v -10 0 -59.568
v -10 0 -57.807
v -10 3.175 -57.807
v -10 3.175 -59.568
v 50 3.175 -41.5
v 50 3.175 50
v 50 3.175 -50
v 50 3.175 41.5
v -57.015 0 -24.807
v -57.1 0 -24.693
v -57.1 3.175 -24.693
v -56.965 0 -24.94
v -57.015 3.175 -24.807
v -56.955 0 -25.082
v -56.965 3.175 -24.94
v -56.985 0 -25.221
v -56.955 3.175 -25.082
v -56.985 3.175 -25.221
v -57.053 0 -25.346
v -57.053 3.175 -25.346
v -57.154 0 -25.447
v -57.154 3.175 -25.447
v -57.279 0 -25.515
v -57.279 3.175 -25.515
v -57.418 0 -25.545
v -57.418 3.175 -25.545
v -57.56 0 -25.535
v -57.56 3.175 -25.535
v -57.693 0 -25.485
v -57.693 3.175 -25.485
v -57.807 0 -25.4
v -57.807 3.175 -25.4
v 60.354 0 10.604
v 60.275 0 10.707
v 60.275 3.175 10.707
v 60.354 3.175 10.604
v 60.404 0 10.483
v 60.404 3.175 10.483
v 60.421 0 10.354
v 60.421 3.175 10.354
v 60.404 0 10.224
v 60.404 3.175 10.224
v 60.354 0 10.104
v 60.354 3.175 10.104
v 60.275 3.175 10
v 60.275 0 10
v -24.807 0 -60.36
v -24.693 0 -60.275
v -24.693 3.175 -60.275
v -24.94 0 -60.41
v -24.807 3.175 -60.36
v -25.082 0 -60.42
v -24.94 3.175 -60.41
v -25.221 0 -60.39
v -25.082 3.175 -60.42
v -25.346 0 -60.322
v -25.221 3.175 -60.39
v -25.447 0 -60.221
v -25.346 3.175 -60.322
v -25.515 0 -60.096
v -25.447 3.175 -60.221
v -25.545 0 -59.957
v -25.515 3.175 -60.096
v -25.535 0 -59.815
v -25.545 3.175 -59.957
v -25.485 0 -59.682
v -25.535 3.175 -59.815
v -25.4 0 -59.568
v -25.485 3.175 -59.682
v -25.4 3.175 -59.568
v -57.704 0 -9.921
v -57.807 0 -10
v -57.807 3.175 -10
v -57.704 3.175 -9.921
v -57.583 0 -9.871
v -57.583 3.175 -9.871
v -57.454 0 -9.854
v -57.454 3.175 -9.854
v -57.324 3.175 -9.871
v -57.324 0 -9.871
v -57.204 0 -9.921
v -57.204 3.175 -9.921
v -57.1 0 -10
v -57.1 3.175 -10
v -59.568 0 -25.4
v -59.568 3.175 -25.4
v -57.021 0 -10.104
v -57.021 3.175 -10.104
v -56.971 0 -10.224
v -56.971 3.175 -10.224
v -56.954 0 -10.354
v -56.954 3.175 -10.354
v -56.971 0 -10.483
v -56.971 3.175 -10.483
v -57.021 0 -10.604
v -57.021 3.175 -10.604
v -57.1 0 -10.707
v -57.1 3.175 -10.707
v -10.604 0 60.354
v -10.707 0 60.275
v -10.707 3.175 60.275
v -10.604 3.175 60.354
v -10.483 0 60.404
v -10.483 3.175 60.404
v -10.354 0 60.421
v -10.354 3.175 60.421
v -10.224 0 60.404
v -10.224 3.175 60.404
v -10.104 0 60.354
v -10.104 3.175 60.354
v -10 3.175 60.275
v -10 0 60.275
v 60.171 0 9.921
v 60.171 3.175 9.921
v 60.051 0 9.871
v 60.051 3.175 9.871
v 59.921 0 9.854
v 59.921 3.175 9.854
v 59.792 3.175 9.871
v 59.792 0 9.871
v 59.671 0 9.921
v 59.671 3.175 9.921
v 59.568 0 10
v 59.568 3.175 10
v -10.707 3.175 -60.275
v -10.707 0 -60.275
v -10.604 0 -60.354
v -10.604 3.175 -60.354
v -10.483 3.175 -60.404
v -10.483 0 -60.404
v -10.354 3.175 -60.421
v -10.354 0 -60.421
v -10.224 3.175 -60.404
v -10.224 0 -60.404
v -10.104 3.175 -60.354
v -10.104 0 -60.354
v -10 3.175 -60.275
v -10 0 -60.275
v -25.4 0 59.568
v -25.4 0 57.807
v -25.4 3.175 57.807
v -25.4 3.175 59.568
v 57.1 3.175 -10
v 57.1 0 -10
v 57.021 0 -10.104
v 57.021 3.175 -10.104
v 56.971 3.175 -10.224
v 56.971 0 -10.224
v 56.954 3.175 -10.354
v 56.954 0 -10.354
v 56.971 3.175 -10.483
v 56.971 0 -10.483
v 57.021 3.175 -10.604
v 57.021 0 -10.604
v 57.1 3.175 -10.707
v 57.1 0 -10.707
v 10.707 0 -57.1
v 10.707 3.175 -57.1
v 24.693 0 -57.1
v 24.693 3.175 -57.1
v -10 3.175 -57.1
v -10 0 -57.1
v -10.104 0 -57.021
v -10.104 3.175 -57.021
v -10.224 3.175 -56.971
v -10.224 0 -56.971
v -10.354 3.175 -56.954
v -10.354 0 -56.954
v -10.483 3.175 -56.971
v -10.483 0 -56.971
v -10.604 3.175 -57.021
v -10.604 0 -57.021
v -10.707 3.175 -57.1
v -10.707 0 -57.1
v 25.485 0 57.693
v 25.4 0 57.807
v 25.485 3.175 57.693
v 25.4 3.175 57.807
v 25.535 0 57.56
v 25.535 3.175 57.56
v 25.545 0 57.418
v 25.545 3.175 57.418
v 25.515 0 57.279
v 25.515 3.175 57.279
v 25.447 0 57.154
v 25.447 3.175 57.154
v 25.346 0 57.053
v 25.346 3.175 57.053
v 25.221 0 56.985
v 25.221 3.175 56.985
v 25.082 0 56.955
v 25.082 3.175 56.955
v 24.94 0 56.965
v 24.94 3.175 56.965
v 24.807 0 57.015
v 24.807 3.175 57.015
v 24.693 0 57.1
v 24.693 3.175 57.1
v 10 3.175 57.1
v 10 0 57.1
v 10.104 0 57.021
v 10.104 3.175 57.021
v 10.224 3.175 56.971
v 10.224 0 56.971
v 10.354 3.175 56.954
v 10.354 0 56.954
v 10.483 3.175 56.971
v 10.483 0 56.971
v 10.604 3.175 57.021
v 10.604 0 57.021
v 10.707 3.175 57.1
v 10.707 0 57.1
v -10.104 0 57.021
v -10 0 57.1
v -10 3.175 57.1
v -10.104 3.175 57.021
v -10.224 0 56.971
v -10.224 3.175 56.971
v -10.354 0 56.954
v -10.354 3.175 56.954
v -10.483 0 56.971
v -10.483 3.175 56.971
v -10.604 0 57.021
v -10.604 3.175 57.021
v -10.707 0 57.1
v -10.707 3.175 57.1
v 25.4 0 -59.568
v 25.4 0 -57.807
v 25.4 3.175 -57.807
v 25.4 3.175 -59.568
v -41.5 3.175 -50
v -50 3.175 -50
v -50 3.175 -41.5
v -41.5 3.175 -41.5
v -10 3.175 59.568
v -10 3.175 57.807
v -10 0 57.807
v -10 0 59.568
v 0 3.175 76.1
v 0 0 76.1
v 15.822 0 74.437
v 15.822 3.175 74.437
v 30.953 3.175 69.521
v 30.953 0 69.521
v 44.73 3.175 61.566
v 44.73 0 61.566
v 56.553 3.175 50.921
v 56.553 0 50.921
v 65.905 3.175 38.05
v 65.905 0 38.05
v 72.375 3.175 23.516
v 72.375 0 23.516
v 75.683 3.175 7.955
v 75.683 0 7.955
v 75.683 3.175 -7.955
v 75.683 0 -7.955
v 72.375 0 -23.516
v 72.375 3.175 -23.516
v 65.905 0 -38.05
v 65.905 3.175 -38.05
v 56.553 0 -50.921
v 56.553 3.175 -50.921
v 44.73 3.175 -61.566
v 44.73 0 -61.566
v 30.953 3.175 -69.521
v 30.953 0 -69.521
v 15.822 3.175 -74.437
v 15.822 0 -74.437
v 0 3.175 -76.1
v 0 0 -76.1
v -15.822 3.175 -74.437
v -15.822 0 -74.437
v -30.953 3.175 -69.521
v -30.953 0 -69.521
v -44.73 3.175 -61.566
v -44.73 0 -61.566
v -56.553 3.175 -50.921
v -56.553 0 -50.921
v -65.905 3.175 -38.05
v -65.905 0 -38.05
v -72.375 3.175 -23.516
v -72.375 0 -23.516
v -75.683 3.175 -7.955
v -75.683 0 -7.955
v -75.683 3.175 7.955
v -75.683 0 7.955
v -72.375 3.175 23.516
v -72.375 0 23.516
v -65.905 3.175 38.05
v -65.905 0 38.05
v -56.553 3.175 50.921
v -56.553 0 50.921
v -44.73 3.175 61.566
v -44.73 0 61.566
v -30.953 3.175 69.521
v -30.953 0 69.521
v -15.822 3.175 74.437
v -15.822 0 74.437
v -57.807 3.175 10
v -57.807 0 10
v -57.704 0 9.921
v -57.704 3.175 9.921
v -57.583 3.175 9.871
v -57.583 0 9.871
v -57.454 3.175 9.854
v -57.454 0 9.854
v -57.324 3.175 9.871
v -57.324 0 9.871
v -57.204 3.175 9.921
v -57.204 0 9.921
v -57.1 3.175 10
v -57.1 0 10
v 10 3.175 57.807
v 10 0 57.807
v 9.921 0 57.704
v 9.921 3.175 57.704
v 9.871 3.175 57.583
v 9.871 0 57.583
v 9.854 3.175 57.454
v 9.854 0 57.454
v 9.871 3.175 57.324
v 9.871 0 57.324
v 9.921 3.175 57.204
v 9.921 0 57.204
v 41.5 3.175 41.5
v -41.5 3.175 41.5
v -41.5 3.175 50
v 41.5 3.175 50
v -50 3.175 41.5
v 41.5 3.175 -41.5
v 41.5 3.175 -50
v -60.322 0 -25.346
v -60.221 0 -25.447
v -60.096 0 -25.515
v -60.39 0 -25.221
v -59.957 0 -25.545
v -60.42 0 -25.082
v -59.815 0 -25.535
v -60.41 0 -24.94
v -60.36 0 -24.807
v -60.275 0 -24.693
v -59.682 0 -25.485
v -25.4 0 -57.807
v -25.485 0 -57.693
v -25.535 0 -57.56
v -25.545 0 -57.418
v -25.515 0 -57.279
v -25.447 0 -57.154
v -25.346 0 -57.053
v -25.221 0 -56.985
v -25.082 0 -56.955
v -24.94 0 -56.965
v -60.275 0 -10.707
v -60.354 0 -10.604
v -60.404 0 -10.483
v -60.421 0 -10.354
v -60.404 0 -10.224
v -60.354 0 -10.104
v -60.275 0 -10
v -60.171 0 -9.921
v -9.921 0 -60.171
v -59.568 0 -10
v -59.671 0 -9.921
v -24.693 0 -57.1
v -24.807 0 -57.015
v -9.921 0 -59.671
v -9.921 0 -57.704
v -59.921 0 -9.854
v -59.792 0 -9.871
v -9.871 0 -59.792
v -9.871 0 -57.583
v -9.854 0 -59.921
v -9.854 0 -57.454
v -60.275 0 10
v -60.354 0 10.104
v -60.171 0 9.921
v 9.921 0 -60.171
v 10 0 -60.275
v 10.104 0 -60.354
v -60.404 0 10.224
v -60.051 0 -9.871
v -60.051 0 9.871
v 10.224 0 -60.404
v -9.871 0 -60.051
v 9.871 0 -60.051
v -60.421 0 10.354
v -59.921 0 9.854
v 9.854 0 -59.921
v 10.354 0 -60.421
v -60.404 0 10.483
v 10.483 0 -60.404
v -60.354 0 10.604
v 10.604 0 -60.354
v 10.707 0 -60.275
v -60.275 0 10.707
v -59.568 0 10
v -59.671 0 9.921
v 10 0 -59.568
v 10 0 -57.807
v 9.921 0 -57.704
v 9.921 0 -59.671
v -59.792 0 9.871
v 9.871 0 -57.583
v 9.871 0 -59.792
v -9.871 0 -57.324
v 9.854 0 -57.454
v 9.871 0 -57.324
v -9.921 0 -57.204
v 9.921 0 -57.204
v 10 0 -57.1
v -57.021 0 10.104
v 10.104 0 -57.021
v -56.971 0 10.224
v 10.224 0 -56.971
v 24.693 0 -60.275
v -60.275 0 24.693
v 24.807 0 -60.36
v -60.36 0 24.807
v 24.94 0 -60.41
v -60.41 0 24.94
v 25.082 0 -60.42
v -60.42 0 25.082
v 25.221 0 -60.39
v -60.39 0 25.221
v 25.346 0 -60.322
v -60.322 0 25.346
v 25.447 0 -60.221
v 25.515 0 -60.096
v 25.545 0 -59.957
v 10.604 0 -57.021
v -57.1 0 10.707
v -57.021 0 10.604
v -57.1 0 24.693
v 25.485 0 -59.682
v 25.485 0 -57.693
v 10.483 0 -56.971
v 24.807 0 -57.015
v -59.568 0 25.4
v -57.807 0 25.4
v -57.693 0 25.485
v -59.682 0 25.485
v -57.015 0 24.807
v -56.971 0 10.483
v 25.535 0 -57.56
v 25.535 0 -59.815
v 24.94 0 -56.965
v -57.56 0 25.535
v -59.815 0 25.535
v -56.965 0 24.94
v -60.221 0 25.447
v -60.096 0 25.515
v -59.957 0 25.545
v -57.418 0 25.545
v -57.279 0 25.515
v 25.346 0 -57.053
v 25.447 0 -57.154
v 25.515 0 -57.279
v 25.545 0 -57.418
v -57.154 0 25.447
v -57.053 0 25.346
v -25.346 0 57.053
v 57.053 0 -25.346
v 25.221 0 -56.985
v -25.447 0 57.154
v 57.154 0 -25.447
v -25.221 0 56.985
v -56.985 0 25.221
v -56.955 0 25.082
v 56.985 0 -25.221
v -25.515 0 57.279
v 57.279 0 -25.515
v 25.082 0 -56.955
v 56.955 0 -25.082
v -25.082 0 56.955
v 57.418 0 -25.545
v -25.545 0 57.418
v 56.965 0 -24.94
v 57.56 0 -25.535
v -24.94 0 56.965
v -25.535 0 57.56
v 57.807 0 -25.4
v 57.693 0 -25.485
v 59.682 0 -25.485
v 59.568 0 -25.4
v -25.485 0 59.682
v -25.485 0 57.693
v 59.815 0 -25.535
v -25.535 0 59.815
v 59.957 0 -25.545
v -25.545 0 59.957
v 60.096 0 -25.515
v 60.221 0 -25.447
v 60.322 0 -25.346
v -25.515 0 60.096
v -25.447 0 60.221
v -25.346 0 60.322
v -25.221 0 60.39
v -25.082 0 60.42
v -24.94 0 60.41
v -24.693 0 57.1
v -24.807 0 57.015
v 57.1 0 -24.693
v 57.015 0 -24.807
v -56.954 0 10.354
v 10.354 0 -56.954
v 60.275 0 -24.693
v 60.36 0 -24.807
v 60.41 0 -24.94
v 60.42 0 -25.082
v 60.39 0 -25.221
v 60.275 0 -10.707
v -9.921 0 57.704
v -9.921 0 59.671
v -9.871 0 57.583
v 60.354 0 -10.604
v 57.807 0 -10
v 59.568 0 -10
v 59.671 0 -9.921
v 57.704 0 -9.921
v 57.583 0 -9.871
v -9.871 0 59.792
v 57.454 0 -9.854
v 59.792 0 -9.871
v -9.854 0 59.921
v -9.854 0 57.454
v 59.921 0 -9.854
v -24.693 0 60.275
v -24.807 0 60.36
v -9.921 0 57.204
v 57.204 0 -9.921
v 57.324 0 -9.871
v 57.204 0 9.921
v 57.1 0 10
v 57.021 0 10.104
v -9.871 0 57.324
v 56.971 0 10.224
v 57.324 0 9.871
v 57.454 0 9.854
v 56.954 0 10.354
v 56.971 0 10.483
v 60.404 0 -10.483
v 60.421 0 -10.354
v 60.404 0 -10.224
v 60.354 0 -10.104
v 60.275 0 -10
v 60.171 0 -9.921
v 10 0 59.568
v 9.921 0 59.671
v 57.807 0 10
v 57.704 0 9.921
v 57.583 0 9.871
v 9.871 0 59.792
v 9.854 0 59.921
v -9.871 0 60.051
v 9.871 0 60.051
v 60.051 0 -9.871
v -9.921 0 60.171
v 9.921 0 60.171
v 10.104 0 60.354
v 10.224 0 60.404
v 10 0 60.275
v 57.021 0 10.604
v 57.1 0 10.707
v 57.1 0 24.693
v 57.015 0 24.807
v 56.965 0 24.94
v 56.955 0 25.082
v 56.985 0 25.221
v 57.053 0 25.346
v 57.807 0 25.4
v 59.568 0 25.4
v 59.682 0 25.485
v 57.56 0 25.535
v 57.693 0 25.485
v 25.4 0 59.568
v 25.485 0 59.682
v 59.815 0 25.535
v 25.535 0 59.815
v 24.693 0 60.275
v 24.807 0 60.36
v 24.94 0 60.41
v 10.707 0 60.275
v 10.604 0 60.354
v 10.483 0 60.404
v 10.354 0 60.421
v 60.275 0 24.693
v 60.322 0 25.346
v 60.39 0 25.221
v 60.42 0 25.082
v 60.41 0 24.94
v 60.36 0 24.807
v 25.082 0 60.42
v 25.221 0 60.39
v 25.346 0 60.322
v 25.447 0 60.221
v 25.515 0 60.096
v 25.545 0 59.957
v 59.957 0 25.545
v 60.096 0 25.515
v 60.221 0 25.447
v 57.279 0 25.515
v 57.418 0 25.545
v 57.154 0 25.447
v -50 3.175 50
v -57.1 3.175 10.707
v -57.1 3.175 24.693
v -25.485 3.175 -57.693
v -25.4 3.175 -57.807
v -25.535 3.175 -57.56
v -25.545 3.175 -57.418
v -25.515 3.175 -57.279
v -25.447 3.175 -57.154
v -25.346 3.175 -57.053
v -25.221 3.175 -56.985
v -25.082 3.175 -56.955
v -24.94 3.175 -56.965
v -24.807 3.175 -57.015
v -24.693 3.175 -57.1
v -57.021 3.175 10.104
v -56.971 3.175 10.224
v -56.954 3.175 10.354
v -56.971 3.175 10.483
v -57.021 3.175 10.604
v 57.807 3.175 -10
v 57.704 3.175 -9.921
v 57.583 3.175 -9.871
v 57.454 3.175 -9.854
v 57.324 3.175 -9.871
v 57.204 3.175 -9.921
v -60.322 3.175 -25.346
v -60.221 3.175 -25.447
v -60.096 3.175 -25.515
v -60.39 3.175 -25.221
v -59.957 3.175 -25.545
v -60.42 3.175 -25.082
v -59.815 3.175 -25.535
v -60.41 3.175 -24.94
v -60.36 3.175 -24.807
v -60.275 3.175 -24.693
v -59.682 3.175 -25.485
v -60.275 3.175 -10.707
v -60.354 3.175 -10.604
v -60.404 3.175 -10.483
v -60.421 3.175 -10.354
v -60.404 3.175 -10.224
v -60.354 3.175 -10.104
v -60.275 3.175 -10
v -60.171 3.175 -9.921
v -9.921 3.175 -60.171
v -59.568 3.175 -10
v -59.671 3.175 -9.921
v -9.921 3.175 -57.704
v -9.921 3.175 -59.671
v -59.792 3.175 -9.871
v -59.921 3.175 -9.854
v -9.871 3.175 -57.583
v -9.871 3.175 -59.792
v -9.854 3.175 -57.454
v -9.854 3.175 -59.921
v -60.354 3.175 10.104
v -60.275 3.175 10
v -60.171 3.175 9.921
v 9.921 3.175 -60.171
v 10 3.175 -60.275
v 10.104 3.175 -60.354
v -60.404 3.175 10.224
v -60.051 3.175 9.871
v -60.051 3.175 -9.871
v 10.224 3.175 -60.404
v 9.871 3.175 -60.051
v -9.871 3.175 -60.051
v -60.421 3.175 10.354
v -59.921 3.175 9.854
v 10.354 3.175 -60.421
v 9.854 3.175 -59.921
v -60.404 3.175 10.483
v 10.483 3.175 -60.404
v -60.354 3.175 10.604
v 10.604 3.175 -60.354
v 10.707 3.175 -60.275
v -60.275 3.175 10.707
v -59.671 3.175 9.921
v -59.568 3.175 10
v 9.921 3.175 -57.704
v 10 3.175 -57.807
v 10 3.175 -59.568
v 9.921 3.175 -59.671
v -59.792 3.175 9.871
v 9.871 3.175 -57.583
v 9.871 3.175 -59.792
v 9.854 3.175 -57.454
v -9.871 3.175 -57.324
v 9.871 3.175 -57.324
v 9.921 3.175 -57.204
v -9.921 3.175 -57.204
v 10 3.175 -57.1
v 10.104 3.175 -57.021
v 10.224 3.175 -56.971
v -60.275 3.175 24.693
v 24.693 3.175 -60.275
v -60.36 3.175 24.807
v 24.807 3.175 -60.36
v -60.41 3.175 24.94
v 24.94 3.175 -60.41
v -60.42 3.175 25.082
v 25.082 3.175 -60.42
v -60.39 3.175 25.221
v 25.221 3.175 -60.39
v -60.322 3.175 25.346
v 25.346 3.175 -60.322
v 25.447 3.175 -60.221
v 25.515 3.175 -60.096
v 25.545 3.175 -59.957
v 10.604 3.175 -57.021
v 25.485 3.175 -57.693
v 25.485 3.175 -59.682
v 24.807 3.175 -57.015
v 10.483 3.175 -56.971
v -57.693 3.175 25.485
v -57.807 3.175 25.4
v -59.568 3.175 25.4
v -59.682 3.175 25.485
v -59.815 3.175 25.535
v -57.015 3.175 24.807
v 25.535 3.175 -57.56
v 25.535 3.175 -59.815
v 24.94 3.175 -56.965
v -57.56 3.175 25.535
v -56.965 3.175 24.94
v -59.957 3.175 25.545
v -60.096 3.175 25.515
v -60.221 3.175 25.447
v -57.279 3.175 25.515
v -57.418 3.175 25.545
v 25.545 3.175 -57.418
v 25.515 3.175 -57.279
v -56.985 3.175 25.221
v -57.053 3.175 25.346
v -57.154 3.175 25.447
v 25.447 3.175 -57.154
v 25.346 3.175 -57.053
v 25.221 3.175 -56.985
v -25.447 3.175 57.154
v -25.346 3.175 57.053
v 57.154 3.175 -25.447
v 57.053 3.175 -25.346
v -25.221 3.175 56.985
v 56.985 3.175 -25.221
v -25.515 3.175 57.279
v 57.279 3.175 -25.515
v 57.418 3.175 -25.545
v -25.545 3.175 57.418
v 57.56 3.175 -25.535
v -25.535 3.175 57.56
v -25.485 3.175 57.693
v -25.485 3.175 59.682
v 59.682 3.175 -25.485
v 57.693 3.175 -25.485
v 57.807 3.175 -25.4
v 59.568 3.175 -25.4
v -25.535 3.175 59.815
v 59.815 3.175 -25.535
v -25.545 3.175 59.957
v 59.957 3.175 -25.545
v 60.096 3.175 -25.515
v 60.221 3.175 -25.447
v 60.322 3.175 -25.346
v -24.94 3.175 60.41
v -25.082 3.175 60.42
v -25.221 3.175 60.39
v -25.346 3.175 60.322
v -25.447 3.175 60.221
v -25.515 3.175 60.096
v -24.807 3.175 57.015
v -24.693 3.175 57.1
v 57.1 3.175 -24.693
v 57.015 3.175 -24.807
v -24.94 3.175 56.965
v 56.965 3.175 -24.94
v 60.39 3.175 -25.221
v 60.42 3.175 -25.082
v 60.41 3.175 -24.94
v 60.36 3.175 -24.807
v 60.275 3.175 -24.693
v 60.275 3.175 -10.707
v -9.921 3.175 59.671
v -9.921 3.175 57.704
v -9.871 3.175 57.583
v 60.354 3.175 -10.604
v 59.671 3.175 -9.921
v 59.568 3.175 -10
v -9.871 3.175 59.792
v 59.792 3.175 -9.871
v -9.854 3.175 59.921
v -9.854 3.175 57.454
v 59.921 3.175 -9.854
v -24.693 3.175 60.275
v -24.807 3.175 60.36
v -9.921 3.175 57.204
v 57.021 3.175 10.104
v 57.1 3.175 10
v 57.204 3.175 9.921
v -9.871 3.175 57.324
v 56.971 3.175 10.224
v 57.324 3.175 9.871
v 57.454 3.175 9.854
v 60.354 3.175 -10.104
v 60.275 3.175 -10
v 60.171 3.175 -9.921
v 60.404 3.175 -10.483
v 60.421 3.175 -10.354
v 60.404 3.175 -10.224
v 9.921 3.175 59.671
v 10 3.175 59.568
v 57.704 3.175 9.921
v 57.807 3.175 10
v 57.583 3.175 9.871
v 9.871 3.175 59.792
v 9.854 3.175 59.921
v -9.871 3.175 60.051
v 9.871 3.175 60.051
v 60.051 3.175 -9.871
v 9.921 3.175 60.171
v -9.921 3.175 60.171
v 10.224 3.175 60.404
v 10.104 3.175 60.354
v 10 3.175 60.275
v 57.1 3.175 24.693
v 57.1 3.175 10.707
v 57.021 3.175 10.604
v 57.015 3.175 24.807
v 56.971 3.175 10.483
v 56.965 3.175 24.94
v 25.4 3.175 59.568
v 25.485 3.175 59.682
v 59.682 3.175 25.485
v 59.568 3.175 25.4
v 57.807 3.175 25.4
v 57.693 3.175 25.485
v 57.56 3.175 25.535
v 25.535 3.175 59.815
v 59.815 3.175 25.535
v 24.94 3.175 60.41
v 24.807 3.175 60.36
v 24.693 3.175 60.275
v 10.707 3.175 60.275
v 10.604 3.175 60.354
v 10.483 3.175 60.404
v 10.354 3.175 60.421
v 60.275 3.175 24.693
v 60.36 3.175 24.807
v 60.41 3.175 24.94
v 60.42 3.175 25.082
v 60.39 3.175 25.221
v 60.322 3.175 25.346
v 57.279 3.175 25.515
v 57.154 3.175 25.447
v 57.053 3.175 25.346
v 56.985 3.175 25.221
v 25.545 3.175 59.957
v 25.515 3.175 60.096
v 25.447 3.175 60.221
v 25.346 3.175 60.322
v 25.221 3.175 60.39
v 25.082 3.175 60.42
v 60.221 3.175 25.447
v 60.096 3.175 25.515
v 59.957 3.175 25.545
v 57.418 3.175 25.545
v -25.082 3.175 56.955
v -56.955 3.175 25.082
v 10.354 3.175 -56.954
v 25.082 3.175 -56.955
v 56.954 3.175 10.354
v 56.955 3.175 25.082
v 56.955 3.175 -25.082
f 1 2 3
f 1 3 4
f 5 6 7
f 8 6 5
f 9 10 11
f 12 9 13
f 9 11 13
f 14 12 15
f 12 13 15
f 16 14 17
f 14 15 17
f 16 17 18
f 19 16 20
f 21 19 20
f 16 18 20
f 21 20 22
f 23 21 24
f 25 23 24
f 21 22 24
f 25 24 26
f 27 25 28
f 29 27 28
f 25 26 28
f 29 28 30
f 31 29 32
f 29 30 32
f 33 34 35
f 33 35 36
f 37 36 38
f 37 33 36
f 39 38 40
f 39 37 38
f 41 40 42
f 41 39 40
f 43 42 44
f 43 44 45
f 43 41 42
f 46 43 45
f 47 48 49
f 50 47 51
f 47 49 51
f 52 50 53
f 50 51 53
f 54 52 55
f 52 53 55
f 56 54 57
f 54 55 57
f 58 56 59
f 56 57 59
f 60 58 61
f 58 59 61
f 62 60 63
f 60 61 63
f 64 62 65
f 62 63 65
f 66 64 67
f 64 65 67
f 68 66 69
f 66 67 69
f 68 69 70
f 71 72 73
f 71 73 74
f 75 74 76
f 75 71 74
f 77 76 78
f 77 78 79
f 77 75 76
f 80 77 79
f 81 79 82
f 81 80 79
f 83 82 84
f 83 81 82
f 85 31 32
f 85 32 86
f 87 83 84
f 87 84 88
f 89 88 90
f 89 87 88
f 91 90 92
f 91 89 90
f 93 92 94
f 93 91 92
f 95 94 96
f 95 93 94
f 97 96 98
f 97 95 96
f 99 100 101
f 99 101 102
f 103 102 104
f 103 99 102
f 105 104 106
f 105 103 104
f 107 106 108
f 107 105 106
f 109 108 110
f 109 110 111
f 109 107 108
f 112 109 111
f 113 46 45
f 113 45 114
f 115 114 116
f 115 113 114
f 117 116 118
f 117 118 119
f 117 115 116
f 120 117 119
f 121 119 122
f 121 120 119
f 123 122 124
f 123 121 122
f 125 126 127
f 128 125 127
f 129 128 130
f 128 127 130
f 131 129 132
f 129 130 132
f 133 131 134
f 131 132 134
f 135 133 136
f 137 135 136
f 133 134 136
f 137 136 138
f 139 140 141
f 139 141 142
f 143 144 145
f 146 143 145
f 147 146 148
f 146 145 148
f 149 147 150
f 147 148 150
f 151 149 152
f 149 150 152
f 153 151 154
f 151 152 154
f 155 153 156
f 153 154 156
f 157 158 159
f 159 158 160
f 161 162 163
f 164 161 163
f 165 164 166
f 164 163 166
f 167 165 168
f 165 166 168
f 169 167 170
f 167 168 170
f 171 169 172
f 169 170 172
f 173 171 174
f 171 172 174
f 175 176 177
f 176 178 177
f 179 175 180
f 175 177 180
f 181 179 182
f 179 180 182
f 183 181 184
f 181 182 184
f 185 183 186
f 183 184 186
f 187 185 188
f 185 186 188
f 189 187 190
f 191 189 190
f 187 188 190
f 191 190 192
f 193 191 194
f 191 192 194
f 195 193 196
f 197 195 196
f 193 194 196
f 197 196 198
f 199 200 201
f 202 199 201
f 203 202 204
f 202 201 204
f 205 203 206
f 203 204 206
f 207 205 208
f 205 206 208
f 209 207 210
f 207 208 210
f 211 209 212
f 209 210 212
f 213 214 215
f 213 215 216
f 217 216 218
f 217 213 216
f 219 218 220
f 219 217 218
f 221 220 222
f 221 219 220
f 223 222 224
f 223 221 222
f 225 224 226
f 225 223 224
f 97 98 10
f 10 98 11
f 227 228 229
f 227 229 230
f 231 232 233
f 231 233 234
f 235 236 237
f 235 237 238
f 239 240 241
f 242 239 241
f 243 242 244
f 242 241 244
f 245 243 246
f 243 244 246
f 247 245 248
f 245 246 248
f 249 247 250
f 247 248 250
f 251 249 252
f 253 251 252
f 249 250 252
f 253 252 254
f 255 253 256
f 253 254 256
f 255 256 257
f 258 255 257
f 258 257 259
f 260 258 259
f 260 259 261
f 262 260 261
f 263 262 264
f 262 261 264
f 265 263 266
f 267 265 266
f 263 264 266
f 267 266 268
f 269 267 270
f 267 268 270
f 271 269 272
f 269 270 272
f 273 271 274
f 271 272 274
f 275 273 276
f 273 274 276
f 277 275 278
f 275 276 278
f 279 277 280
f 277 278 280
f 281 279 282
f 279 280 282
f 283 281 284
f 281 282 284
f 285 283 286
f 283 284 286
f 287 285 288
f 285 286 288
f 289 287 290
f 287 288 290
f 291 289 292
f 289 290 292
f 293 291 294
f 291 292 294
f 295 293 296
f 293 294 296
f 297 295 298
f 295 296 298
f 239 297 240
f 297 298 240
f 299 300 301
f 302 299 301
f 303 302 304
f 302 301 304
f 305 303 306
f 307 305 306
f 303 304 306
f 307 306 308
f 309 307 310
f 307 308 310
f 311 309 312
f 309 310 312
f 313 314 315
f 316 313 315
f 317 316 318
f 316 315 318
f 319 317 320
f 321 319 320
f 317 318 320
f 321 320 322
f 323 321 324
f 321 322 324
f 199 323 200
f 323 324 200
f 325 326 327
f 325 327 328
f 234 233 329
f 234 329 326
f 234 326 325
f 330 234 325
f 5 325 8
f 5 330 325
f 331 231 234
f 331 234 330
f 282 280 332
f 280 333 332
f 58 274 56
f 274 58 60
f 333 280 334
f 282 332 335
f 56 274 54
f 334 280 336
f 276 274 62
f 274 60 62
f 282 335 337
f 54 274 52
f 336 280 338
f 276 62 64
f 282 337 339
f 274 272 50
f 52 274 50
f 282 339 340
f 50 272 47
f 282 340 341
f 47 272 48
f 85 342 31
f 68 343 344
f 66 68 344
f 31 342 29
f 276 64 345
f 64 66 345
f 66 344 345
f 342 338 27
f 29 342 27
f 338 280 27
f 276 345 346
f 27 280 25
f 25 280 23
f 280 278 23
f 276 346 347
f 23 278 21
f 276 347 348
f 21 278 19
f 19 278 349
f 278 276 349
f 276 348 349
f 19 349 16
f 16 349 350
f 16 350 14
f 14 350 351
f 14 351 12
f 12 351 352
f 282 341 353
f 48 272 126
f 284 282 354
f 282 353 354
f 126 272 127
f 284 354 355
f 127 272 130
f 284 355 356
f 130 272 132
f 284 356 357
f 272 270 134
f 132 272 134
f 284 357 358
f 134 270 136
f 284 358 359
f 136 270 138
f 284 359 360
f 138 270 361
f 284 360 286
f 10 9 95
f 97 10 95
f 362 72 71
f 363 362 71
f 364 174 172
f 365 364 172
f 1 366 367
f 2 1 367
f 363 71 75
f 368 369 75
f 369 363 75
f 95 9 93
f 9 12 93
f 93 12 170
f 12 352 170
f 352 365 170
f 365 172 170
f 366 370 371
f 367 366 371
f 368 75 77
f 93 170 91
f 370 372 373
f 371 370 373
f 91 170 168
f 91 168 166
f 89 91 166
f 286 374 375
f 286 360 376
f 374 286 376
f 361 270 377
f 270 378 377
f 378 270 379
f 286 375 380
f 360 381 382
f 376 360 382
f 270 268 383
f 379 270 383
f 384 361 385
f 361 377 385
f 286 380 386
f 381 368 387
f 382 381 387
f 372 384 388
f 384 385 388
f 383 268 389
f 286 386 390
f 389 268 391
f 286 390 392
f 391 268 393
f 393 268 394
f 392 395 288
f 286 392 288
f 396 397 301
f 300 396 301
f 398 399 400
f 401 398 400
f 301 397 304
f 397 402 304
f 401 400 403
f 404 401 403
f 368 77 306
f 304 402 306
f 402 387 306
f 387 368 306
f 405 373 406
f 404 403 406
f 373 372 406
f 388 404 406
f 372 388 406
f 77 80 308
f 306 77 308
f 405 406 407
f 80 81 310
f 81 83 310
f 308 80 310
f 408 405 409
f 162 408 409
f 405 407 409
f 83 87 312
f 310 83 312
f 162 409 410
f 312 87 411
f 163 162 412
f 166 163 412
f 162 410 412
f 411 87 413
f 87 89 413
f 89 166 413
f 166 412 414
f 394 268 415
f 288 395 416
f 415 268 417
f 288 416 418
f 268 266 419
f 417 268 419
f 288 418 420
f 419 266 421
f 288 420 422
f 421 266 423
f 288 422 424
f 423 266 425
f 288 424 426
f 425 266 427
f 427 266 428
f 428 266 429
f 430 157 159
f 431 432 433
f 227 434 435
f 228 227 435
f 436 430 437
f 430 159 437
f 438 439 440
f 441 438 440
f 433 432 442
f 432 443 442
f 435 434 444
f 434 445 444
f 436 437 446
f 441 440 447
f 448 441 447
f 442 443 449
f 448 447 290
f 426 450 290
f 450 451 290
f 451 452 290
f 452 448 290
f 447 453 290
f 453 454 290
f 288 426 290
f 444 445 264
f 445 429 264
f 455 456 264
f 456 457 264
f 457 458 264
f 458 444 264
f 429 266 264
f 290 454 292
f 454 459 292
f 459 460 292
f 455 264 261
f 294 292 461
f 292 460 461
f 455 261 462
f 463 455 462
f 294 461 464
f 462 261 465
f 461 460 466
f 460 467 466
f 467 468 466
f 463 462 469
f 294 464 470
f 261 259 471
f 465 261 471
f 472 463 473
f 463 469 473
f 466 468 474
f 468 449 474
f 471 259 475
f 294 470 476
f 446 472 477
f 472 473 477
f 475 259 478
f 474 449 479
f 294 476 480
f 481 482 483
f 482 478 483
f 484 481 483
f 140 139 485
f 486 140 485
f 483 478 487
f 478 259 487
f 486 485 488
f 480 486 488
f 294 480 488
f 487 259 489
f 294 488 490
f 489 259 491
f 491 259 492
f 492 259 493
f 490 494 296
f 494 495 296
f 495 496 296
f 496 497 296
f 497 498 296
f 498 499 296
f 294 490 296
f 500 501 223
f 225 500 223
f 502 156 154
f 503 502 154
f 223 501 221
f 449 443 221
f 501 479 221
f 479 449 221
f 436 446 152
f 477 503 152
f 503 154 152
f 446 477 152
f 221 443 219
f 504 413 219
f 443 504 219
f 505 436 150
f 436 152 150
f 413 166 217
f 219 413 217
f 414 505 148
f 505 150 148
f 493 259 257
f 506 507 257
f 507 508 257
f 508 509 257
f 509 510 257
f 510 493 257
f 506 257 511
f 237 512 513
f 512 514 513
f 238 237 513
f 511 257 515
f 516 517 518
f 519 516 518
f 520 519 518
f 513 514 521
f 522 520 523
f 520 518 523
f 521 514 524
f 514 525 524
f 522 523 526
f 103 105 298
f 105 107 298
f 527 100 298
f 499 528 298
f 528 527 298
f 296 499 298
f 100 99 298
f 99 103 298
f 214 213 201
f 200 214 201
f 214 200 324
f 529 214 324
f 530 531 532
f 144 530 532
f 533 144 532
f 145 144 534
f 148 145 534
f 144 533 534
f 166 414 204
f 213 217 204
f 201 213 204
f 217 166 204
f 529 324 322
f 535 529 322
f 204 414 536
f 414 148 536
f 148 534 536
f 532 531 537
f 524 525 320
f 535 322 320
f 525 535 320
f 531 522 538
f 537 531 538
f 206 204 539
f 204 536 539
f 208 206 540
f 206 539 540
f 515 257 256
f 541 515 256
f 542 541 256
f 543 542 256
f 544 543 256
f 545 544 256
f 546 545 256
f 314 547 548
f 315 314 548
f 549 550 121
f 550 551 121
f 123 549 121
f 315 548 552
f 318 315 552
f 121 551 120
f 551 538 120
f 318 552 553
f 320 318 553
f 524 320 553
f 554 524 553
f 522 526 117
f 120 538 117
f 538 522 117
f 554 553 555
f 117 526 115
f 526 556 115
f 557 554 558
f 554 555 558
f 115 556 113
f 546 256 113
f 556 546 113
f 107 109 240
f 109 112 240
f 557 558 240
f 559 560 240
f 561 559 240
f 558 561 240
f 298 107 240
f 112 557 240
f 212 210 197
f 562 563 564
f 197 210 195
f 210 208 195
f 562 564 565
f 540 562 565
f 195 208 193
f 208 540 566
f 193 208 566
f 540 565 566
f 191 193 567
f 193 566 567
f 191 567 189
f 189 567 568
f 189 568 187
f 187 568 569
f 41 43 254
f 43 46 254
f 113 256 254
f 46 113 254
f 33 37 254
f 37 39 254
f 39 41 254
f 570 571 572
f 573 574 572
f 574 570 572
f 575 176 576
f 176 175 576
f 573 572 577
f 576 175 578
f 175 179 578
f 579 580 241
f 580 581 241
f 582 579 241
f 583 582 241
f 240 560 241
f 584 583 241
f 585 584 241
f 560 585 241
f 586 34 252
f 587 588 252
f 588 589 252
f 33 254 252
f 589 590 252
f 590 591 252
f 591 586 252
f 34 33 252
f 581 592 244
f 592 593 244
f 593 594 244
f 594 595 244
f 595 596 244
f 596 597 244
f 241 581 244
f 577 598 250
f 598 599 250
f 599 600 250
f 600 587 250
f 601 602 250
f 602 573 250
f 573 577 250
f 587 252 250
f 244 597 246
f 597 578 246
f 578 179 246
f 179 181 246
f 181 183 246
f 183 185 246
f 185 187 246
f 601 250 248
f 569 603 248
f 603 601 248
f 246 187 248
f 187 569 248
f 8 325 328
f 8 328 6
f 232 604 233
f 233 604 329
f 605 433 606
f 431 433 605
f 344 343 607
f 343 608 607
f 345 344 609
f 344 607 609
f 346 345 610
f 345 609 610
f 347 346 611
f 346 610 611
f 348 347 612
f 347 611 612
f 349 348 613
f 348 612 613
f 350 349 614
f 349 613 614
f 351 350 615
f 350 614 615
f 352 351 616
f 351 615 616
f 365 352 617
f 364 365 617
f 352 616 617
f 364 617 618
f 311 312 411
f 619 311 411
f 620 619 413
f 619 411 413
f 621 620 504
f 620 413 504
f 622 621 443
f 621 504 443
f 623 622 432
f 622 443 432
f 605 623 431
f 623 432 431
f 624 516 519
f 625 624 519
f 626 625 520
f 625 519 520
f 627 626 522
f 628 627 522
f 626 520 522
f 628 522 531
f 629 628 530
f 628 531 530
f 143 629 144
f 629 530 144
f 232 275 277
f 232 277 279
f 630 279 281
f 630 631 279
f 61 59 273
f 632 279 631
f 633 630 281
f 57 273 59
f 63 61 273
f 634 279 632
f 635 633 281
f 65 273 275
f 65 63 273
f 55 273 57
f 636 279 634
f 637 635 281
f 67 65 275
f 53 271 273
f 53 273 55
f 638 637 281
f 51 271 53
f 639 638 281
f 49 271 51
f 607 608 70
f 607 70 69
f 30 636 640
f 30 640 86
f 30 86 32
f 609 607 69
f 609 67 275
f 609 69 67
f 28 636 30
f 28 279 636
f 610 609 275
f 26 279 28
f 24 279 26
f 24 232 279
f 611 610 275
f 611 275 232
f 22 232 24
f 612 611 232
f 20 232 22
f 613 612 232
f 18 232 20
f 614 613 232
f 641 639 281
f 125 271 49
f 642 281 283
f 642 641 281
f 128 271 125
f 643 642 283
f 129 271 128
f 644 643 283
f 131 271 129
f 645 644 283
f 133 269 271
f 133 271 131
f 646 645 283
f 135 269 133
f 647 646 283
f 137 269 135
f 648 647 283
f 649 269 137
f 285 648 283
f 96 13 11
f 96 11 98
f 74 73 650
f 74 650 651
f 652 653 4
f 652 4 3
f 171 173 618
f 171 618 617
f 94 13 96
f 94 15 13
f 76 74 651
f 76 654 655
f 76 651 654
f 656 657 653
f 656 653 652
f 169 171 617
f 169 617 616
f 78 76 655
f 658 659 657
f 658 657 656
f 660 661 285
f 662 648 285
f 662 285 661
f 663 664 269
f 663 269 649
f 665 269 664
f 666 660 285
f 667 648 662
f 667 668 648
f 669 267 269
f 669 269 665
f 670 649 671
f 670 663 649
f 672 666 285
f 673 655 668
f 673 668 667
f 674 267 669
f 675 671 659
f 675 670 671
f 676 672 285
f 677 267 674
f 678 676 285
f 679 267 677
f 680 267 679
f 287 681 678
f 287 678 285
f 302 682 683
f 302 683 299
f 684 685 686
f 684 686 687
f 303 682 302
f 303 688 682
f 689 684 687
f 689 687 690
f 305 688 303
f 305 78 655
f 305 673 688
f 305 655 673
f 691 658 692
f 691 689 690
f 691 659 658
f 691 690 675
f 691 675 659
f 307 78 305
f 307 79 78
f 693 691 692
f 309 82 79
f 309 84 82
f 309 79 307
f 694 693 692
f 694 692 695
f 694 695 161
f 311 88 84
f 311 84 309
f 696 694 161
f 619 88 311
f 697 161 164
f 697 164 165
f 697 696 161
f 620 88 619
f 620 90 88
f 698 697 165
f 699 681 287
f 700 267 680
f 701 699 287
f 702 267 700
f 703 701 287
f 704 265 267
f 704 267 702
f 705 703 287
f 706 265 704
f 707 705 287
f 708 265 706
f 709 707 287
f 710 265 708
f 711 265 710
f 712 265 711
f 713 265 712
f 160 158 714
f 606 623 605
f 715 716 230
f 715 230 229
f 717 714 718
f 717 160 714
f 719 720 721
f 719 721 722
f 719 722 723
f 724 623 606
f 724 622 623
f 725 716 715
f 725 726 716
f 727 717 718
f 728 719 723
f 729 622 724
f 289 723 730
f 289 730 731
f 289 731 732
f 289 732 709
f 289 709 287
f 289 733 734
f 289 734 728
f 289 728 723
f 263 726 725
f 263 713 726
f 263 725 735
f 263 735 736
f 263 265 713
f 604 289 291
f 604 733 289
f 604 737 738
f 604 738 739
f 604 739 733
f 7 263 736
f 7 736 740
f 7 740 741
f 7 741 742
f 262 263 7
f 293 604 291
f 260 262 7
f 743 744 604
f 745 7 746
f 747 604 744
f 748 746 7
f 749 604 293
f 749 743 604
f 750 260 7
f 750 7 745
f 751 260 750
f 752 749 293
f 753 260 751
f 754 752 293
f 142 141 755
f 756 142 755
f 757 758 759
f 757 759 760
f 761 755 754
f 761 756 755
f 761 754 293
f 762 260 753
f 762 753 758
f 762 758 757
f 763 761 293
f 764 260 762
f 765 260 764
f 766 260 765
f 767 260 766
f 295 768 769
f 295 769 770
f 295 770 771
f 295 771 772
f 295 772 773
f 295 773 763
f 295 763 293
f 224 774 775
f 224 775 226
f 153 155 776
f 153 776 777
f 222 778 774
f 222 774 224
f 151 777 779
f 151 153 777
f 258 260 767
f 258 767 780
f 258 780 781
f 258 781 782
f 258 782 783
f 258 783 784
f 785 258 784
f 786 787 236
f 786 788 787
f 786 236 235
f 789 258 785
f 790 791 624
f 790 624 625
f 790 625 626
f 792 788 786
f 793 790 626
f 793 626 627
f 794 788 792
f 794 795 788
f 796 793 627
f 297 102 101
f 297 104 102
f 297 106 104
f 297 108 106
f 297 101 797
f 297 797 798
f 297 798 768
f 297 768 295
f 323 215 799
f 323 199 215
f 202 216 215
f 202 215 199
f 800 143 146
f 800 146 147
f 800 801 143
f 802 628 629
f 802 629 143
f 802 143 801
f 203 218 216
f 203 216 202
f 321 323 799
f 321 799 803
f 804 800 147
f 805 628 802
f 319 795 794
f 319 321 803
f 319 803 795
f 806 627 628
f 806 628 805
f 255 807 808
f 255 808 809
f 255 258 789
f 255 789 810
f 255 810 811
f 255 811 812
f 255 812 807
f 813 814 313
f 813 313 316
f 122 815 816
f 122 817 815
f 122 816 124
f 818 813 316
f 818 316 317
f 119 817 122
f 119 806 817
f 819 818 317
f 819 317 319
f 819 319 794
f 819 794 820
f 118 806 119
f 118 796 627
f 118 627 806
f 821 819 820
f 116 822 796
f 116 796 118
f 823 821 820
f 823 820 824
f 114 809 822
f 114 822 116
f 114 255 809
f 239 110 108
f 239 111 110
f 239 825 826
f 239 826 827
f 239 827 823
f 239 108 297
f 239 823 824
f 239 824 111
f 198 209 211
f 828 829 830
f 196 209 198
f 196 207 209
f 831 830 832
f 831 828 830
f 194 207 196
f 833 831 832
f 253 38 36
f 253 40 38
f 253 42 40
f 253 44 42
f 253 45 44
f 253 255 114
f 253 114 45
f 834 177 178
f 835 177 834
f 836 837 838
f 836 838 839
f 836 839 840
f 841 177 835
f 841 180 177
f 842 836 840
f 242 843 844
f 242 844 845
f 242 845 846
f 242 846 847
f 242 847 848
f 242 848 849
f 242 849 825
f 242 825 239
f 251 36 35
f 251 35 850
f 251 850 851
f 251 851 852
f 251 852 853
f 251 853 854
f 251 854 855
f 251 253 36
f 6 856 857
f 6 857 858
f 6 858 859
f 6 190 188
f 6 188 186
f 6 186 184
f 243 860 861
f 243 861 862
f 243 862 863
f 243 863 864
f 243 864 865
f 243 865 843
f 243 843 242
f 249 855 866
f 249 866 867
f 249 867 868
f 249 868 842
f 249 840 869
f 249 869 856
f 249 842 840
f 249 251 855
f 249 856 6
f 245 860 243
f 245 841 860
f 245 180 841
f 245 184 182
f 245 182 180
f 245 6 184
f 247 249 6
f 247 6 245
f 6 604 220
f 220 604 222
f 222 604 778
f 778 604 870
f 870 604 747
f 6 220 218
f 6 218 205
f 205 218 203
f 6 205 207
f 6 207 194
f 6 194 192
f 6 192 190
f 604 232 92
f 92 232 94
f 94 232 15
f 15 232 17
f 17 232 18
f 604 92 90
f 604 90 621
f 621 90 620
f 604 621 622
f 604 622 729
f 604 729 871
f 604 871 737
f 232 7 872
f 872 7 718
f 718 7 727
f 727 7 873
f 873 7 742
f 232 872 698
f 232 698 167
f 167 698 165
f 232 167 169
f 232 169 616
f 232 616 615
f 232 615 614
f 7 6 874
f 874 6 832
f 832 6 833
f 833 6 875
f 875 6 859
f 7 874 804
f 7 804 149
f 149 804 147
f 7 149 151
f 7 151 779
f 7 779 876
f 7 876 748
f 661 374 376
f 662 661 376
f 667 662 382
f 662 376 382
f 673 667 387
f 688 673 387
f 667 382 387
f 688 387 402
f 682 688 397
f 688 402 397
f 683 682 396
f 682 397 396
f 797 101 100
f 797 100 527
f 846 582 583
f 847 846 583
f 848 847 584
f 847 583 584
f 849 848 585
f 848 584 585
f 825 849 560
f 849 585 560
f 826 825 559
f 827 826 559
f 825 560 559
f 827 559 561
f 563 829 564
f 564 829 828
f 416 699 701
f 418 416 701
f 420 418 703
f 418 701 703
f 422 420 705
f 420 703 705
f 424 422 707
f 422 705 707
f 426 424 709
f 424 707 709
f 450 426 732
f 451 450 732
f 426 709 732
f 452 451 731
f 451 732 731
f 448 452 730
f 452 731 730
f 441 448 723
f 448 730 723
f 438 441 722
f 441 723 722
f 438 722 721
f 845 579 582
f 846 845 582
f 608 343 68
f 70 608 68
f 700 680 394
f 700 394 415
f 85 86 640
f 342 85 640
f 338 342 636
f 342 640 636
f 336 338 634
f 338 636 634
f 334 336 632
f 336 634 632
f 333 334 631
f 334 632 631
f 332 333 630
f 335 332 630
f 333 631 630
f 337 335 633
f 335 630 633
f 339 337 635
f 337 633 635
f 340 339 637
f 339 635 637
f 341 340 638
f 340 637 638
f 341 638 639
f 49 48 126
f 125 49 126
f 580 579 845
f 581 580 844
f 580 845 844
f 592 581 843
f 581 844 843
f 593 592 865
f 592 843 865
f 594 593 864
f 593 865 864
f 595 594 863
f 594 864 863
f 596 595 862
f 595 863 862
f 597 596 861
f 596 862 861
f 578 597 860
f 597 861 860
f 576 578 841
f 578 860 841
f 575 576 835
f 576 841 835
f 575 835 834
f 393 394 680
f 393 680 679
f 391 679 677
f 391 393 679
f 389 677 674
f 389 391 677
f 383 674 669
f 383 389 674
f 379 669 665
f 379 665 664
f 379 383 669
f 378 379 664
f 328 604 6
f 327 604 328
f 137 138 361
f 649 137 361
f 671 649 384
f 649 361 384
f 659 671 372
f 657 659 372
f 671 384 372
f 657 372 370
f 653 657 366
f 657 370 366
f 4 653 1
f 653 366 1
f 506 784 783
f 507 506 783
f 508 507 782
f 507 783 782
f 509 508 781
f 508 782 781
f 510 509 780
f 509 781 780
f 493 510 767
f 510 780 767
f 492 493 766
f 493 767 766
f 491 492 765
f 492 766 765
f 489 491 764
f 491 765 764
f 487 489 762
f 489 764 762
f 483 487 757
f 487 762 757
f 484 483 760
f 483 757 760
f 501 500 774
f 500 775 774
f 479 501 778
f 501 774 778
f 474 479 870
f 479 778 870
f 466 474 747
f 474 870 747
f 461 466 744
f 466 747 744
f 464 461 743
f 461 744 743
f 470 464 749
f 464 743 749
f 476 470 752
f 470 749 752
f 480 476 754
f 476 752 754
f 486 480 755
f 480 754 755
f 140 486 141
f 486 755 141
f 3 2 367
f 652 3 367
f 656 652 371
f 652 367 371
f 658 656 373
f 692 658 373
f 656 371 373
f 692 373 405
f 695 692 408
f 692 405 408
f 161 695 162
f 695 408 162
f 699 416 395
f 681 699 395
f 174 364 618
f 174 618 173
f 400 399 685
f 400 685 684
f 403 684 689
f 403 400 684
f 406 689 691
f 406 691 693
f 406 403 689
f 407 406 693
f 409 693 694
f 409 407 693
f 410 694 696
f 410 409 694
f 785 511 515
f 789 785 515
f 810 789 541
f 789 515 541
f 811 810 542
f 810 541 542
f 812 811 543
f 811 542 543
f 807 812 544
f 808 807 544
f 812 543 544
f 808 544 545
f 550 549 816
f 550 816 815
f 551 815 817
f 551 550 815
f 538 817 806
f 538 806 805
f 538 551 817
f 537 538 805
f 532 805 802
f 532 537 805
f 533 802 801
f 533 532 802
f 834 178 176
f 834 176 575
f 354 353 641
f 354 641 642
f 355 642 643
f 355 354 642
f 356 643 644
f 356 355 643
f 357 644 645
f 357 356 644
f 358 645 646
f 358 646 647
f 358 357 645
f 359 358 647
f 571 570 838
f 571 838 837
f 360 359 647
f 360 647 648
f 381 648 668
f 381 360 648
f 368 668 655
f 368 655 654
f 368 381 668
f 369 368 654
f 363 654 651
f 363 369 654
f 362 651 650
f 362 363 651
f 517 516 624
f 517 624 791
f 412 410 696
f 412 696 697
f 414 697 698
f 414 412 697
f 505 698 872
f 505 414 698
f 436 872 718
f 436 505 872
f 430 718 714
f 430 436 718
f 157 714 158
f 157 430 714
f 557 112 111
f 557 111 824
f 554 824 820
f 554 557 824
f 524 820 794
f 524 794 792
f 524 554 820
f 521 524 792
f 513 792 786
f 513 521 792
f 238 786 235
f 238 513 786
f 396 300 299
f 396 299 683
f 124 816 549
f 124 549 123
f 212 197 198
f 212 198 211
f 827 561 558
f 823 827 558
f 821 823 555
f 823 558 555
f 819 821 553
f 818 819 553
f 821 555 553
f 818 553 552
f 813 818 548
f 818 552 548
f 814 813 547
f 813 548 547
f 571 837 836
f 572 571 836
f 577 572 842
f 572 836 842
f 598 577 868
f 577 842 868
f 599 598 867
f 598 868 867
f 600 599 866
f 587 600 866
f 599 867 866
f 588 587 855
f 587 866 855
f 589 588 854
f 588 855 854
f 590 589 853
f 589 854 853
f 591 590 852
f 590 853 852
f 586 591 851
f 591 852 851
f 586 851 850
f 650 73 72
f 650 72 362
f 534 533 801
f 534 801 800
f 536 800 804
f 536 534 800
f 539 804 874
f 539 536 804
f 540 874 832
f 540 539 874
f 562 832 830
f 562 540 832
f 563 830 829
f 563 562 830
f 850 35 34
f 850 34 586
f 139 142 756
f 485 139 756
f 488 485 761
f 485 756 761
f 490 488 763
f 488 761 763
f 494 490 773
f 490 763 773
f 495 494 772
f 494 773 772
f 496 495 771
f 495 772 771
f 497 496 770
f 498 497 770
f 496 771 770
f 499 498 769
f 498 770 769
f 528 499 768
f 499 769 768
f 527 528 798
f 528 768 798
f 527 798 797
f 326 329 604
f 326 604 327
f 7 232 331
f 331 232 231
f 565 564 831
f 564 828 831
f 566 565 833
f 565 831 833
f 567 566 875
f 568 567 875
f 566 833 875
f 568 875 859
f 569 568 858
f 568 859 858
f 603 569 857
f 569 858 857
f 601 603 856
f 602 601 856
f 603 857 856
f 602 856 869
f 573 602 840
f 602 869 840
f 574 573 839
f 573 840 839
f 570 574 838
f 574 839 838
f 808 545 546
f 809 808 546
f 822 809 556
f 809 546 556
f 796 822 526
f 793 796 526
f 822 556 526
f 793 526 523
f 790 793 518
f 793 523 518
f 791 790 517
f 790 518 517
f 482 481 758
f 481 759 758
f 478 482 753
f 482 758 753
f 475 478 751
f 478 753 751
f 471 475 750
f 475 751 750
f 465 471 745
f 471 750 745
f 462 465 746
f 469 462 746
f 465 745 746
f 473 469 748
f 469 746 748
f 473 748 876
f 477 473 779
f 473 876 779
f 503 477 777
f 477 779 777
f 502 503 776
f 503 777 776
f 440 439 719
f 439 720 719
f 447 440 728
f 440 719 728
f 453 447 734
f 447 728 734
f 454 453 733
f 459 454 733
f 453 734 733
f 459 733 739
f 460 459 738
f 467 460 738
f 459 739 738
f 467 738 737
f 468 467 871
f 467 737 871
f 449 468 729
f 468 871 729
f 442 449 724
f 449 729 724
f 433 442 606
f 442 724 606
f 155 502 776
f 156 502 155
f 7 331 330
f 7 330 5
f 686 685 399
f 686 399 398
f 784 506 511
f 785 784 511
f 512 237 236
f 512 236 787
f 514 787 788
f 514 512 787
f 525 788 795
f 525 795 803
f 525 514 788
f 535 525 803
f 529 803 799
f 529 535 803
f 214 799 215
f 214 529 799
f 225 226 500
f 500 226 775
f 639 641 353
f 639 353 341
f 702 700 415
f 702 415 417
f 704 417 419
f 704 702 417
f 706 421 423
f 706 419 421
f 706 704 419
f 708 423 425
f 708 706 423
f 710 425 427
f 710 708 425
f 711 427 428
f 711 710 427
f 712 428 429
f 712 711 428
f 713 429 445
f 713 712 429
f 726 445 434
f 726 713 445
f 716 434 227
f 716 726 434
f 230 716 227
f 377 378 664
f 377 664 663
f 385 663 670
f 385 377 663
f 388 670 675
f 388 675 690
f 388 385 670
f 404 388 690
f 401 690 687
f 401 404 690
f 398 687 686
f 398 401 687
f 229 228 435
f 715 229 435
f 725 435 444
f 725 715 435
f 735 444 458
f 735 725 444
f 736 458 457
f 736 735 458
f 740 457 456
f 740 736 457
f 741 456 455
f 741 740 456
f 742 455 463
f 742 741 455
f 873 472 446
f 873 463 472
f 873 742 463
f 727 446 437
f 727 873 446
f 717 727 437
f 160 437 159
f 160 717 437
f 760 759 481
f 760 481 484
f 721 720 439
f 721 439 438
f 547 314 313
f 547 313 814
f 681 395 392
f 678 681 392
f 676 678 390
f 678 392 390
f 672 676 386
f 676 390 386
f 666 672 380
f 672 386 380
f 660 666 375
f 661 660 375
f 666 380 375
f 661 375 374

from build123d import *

# Parameters (mm, degrees)
SKETCH1_R                   = 76.1
BOSS_EXTRUDE1_DEPTH         = 3.175
SKETCH3_W                   = 15.4
SKETCH3_H                   = 3.175
CUT_EXTRUDE1_DEPTH          = 108.66847554
SKETCH4_R                   = 0.5
CUT_EXTRUDE2_DEPTH          = 108.66847554
SKETCH_PATTERN1_DEPTH       = 3.175
CIRPATTERN1_COUNT           = 4
CIRPATTERN1_COPY_1_SKETCH_R = 0.5
CIRPATTERN1_COPY_1_DEPTH    = 108.66847554
CIRPATTERN1_COPY_2_SKETCH_R = 0.5
CIRPATTERN1_COPY_2_DEPTH    = 108.66847554
CIRPATTERN1_COPY_3_SKETCH_R = 0.5
CIRPATTERN1_COPY_3_DEPTH    = 108.66847554
CIRPATTERN1_COPY_4_DEPTH    = 3.175
CIRPATTERN1_COPY_5_DEPTH    = 3.175
CIRPATTERN1_COPY_6_DEPTH    = 3.175
SKETCH2_W                   = 100
SKETCH2_H                   = 100
CUT_EXTRUDE3_DEPTH          = 0.0001
SKETCH7_W                   = 8.5
SKETCH7_H                   = 8.5
CUT_EXTRUDE4_DEPTH          = 0.0001


# Read off the part's stored shape, not the designer's step: Sketch-Pattern1
with BuildPart() as part:
    # Sketch1 → Boss-Extrude1 (new body)
    with BuildSketch(Plane(origin=(0, 0, 0), x_dir=(1, 0, 0), z_dir=(0, 1, 0))):
        with Locations(Location((0, 0, 0), (0, 0, 270))):
            Circle(SKETCH1_R)
    extrude(amount=BOSS_EXTRUDE1_DEPTH)

    # Sketch3 → Cut-Extrude1 (cut, symmetric)
    with BuildSketch(Plane(origin=(0, 3.175, 0), x_dir=(1, 0, 0), z_dir=(0, 1, 0))):
        with Locations((-17.7, 58.6875)):
            Rectangle(SKETCH3_W, SKETCH3_H)
        with Locations((17.7, 58.6875)):
            Rectangle(SKETCH3_W, SKETCH3_H)
    cut_extrude1 = extrude(amount=CUT_EXTRUDE1_DEPTH, both=True, mode=Mode.SUBTRACT)

    # Sketch4 → Cut-Extrude2 (cut, symmetric)
    with BuildSketch(Plane(origin=(0, 3.175, 0), x_dir=(1, 0, 0), z_dir=(0, 1, 0))):
        with Locations((-25.046446609, 59.921446609)):
            Circle(SKETCH4_R)
        with Locations((-25.046446609, 57.453553391)):
            Circle(SKETCH4_R)
    cut_extrude2 = extrude(amount=CUT_EXTRUDE2_DEPTH, both=True, mode=Mode.SUBTRACT)

    # Sketch-Pattern1 outline → Sketch-Pattern1 (cut)
    with BuildSketch(Plane(origin=(0, 0, 0), x_dir=(1, 0, 0), z_dir=(0, 1, 0))):
        with BuildLine():
            Line((10, 60.275), (10.707106781, 60.275))
            ThreePointArc((10.707106781, 60.275), (10.353553391, 60.421446609), (10, 60.275))
        make_face()
        with BuildLine():
            Line((10.707106781, 57.1), (10, 57.1))
            ThreePointArc((10, 57.1), (10.353553391, 56.953553391), (10.707106781, 57.1))
        make_face()
        with BuildLine():
            Line((10, 57.1), (10, 57.807106781))
            ThreePointArc((10, 57.807106781), (9.853553391, 57.453553391), (10, 57.1))
        make_face()
        with BuildLine():
            Line((10, 59.567893219), (10, 60.275))
            ThreePointArc((10, 60.275), (9.853553391, 59.921446609), (10, 59.567893219))
        make_face()
    sketch_pattern1 = extrude(amount=SKETCH_PATTERN1_DEPTH, mode=Mode.SUBTRACT)

    # Mirror1: Cut-Extrude2, Sketch-Pattern1 across plane
    add(cut_extrude2.mirror(Plane(origin=(0, 0, 0), x_dir=(0, 0, 1), z_dir=(1, 0, 0))), mode=Mode.SUBTRACT)
    add(sketch_pattern1.mirror(Plane(origin=(0, 0, 0), x_dir=(0, 0, 1), z_dir=(1, 0, 0))), mode=Mode.SUBTRACT)

    # CirPattern1: Cut-Extrude1, Cut-Extrude2, Sketch-Pattern1 ×4 about axis
    cirpattern1_axis = Axis((0, 0, 0), (0, 1, 0))
    add([cut_extrude1.rotate(cirpattern1_axis, i * 360 / CIRPATTERN1_COUNT) for i in range(1, CIRPATTERN1_COUNT)], mode=Mode.SUBTRACT)
    add([cut_extrude2.rotate(cirpattern1_axis, i * 360 / CIRPATTERN1_COUNT) for i in range(1, CIRPATTERN1_COUNT)], mode=Mode.SUBTRACT)
    add([sketch_pattern1.rotate(cirpattern1_axis, i * 360 / CIRPATTERN1_COUNT) for i in range(1, CIRPATTERN1_COUNT)], mode=Mode.SUBTRACT)

    # CirPattern1 copy 1 sketch → CirPattern1 copy 1 (cut, symmetric)
    with BuildSketch(Plane.ZX.offset(3.175)):
        with Locations((-25.046446609, -59.921446609)):
            Circle(CIRPATTERN1_COPY_1_SKETCH_R)
        with Locations((-25.046446609, -57.453553391)):
            Circle(CIRPATTERN1_COPY_1_SKETCH_R)
    extrude(amount=CIRPATTERN1_COPY_1_DEPTH, both=True, mode=Mode.SUBTRACT)

    # CirPattern1 copy 2 sketch → CirPattern1 copy 2 (cut, symmetric)
    with BuildSketch(Plane(origin=(0, 3.175, 0), x_dir=(1, 0, 0), z_dir=(0, 1, 0))):
        with Locations((-25.046446609, -59.921446609)):
            Circle(CIRPATTERN1_COPY_2_SKETCH_R)
        with Locations((-25.046446609, -57.453553391)):
            Circle(CIRPATTERN1_COPY_2_SKETCH_R)
    extrude(amount=CIRPATTERN1_COPY_2_DEPTH, both=True, mode=Mode.SUBTRACT)

    # CirPattern1 copy 3 sketch → CirPattern1 copy 3 (cut, symmetric)
    with BuildSketch(Plane(origin=(0, 3.175, 0), x_dir=(0, 0, -1), z_dir=(0, 1, 0))):
        with Locations((-25.046446609, -59.921446609)):
            Circle(CIRPATTERN1_COPY_3_SKETCH_R)
        with Locations((-25.046446609, -57.453553391)):
            Circle(CIRPATTERN1_COPY_3_SKETCH_R)
    extrude(amount=CIRPATTERN1_COPY_3_DEPTH, both=True, mode=Mode.SUBTRACT)

    # CirPattern1 copy 4 sketch → CirPattern1 copy 4 (cut)
    with BuildSketch(Plane.ZX):
        with BuildLine():
            Line((10, -60.275), (10.707106781, -60.275))
            ThreePointArc((10.707106781, -60.275), (10.353553391, -60.421446609), (10, -60.275))
        make_face()
        with BuildLine():
            Line((10.707106781, -57.1), (10, -57.1))
            ThreePointArc((10, -57.1), (10.353553391, -56.953553391), (10.707106781, -57.1))
        make_face()
        with BuildLine():
            Line((10, -57.1), (10, -57.807106781))
            ThreePointArc((10, -57.807106781), (9.853553391, -57.453553391), (10, -57.1))
        make_face()
        with BuildLine():
            Line((10, -59.567893219), (10, -60.275))
            ThreePointArc((10, -60.275), (9.853553391, -59.921446609), (10, -59.567893219))
        make_face()
    extrude(amount=CIRPATTERN1_COPY_4_DEPTH, mode=Mode.SUBTRACT)

    # CirPattern1 copy 5 sketch → CirPattern1 copy 5 (cut)
    with BuildSketch(Plane(origin=(0, 0, 0), x_dir=(1, 0, 0), z_dir=(0, 1, 0))):
        with BuildLine():
            Line((10, -60.275), (10.707106781, -60.275))
            ThreePointArc((10.707106781, -60.275), (10.353553391, -60.421446609), (10, -60.275))
        make_face()
        with BuildLine():
            Line((10.707106781, -57.1), (10, -57.1))
            ThreePointArc((10, -57.1), (10.353553391, -56.953553391), (10.707106781, -57.1))
        make_face()
        with BuildLine():
            Line((10, -57.1), (10, -57.807106781))
            ThreePointArc((10, -57.807106781), (9.853553391, -57.453553391), (10, -57.1))
        make_face()
        with BuildLine():
            Line((10, -59.567893219), (10, -60.275))
            ThreePointArc((10, -60.275), (9.853553391, -59.921446609), (10, -59.567893219))
        make_face()
    extrude(amount=CIRPATTERN1_COPY_5_DEPTH, mode=Mode.SUBTRACT)

    # CirPattern1 copy 6 sketch → CirPattern1 copy 6 (cut)
    with BuildSketch(Plane(origin=(0, 0, 0), x_dir=(0, 0, -1), z_dir=(0, 1, 0))):
        with BuildLine():
            Line((10, -60.275), (10.707106781, -60.275))
            ThreePointArc((10.707106781, -60.275), (10.353553391, -60.421446609), (10, -60.275))
        make_face()
        with BuildLine():
            Line((10.707106781, -57.1), (10, -57.1))
            ThreePointArc((10, -57.1), (10.353553391, -56.953553391), (10.707106781, -57.1))
        make_face()
        with BuildLine():
            Line((10, -57.1), (10, -57.807106781))
            ThreePointArc((10, -57.807106781), (9.853553391, -57.453553391), (10, -57.1))
        make_face()
        with BuildLine():
            Line((10, -59.567893219), (10, -60.275))
            ThreePointArc((10, -60.275), (9.853553391, -59.921446609), (10, -59.567893219))
        make_face()
    extrude(amount=CIRPATTERN1_COPY_6_DEPTH, mode=Mode.SUBTRACT)

    # Sketch2 → Cut-Extrude3 (cut)
    with BuildSketch(Plane(origin=(0, 3.175, 0), x_dir=(1, 0, 0), z_dir=(0, 1, 0))):
        Rectangle(SKETCH2_W, SKETCH2_H)
    extrude(amount=-CUT_EXTRUDE3_DEPTH, mode=Mode.SUBTRACT)

    # Sketch7 → Cut-Extrude4 (cut)
    with BuildSketch(Plane(origin=(0, 3.1749, 0), x_dir=(1, 0, 0), z_dir=(0, 1, 0))):
        with Locations((-45.75, 45.75)):
            Rectangle(SKETCH7_W, SKETCH7_H)
        with Locations((45.75, 45.75)):
            Rectangle(SKETCH7_W, SKETCH7_H)
        with Locations((45.75, -45.75)):
            Rectangle(SKETCH7_W, SKETCH7_H)
        with Locations((-45.75, -45.75)):
            Rectangle(SKETCH7_W, SKETCH7_H)
    extrude(amount=-CUT_EXTRUDE4_DEPTH, mode=Mode.SUBTRACT)


solid = part.part
